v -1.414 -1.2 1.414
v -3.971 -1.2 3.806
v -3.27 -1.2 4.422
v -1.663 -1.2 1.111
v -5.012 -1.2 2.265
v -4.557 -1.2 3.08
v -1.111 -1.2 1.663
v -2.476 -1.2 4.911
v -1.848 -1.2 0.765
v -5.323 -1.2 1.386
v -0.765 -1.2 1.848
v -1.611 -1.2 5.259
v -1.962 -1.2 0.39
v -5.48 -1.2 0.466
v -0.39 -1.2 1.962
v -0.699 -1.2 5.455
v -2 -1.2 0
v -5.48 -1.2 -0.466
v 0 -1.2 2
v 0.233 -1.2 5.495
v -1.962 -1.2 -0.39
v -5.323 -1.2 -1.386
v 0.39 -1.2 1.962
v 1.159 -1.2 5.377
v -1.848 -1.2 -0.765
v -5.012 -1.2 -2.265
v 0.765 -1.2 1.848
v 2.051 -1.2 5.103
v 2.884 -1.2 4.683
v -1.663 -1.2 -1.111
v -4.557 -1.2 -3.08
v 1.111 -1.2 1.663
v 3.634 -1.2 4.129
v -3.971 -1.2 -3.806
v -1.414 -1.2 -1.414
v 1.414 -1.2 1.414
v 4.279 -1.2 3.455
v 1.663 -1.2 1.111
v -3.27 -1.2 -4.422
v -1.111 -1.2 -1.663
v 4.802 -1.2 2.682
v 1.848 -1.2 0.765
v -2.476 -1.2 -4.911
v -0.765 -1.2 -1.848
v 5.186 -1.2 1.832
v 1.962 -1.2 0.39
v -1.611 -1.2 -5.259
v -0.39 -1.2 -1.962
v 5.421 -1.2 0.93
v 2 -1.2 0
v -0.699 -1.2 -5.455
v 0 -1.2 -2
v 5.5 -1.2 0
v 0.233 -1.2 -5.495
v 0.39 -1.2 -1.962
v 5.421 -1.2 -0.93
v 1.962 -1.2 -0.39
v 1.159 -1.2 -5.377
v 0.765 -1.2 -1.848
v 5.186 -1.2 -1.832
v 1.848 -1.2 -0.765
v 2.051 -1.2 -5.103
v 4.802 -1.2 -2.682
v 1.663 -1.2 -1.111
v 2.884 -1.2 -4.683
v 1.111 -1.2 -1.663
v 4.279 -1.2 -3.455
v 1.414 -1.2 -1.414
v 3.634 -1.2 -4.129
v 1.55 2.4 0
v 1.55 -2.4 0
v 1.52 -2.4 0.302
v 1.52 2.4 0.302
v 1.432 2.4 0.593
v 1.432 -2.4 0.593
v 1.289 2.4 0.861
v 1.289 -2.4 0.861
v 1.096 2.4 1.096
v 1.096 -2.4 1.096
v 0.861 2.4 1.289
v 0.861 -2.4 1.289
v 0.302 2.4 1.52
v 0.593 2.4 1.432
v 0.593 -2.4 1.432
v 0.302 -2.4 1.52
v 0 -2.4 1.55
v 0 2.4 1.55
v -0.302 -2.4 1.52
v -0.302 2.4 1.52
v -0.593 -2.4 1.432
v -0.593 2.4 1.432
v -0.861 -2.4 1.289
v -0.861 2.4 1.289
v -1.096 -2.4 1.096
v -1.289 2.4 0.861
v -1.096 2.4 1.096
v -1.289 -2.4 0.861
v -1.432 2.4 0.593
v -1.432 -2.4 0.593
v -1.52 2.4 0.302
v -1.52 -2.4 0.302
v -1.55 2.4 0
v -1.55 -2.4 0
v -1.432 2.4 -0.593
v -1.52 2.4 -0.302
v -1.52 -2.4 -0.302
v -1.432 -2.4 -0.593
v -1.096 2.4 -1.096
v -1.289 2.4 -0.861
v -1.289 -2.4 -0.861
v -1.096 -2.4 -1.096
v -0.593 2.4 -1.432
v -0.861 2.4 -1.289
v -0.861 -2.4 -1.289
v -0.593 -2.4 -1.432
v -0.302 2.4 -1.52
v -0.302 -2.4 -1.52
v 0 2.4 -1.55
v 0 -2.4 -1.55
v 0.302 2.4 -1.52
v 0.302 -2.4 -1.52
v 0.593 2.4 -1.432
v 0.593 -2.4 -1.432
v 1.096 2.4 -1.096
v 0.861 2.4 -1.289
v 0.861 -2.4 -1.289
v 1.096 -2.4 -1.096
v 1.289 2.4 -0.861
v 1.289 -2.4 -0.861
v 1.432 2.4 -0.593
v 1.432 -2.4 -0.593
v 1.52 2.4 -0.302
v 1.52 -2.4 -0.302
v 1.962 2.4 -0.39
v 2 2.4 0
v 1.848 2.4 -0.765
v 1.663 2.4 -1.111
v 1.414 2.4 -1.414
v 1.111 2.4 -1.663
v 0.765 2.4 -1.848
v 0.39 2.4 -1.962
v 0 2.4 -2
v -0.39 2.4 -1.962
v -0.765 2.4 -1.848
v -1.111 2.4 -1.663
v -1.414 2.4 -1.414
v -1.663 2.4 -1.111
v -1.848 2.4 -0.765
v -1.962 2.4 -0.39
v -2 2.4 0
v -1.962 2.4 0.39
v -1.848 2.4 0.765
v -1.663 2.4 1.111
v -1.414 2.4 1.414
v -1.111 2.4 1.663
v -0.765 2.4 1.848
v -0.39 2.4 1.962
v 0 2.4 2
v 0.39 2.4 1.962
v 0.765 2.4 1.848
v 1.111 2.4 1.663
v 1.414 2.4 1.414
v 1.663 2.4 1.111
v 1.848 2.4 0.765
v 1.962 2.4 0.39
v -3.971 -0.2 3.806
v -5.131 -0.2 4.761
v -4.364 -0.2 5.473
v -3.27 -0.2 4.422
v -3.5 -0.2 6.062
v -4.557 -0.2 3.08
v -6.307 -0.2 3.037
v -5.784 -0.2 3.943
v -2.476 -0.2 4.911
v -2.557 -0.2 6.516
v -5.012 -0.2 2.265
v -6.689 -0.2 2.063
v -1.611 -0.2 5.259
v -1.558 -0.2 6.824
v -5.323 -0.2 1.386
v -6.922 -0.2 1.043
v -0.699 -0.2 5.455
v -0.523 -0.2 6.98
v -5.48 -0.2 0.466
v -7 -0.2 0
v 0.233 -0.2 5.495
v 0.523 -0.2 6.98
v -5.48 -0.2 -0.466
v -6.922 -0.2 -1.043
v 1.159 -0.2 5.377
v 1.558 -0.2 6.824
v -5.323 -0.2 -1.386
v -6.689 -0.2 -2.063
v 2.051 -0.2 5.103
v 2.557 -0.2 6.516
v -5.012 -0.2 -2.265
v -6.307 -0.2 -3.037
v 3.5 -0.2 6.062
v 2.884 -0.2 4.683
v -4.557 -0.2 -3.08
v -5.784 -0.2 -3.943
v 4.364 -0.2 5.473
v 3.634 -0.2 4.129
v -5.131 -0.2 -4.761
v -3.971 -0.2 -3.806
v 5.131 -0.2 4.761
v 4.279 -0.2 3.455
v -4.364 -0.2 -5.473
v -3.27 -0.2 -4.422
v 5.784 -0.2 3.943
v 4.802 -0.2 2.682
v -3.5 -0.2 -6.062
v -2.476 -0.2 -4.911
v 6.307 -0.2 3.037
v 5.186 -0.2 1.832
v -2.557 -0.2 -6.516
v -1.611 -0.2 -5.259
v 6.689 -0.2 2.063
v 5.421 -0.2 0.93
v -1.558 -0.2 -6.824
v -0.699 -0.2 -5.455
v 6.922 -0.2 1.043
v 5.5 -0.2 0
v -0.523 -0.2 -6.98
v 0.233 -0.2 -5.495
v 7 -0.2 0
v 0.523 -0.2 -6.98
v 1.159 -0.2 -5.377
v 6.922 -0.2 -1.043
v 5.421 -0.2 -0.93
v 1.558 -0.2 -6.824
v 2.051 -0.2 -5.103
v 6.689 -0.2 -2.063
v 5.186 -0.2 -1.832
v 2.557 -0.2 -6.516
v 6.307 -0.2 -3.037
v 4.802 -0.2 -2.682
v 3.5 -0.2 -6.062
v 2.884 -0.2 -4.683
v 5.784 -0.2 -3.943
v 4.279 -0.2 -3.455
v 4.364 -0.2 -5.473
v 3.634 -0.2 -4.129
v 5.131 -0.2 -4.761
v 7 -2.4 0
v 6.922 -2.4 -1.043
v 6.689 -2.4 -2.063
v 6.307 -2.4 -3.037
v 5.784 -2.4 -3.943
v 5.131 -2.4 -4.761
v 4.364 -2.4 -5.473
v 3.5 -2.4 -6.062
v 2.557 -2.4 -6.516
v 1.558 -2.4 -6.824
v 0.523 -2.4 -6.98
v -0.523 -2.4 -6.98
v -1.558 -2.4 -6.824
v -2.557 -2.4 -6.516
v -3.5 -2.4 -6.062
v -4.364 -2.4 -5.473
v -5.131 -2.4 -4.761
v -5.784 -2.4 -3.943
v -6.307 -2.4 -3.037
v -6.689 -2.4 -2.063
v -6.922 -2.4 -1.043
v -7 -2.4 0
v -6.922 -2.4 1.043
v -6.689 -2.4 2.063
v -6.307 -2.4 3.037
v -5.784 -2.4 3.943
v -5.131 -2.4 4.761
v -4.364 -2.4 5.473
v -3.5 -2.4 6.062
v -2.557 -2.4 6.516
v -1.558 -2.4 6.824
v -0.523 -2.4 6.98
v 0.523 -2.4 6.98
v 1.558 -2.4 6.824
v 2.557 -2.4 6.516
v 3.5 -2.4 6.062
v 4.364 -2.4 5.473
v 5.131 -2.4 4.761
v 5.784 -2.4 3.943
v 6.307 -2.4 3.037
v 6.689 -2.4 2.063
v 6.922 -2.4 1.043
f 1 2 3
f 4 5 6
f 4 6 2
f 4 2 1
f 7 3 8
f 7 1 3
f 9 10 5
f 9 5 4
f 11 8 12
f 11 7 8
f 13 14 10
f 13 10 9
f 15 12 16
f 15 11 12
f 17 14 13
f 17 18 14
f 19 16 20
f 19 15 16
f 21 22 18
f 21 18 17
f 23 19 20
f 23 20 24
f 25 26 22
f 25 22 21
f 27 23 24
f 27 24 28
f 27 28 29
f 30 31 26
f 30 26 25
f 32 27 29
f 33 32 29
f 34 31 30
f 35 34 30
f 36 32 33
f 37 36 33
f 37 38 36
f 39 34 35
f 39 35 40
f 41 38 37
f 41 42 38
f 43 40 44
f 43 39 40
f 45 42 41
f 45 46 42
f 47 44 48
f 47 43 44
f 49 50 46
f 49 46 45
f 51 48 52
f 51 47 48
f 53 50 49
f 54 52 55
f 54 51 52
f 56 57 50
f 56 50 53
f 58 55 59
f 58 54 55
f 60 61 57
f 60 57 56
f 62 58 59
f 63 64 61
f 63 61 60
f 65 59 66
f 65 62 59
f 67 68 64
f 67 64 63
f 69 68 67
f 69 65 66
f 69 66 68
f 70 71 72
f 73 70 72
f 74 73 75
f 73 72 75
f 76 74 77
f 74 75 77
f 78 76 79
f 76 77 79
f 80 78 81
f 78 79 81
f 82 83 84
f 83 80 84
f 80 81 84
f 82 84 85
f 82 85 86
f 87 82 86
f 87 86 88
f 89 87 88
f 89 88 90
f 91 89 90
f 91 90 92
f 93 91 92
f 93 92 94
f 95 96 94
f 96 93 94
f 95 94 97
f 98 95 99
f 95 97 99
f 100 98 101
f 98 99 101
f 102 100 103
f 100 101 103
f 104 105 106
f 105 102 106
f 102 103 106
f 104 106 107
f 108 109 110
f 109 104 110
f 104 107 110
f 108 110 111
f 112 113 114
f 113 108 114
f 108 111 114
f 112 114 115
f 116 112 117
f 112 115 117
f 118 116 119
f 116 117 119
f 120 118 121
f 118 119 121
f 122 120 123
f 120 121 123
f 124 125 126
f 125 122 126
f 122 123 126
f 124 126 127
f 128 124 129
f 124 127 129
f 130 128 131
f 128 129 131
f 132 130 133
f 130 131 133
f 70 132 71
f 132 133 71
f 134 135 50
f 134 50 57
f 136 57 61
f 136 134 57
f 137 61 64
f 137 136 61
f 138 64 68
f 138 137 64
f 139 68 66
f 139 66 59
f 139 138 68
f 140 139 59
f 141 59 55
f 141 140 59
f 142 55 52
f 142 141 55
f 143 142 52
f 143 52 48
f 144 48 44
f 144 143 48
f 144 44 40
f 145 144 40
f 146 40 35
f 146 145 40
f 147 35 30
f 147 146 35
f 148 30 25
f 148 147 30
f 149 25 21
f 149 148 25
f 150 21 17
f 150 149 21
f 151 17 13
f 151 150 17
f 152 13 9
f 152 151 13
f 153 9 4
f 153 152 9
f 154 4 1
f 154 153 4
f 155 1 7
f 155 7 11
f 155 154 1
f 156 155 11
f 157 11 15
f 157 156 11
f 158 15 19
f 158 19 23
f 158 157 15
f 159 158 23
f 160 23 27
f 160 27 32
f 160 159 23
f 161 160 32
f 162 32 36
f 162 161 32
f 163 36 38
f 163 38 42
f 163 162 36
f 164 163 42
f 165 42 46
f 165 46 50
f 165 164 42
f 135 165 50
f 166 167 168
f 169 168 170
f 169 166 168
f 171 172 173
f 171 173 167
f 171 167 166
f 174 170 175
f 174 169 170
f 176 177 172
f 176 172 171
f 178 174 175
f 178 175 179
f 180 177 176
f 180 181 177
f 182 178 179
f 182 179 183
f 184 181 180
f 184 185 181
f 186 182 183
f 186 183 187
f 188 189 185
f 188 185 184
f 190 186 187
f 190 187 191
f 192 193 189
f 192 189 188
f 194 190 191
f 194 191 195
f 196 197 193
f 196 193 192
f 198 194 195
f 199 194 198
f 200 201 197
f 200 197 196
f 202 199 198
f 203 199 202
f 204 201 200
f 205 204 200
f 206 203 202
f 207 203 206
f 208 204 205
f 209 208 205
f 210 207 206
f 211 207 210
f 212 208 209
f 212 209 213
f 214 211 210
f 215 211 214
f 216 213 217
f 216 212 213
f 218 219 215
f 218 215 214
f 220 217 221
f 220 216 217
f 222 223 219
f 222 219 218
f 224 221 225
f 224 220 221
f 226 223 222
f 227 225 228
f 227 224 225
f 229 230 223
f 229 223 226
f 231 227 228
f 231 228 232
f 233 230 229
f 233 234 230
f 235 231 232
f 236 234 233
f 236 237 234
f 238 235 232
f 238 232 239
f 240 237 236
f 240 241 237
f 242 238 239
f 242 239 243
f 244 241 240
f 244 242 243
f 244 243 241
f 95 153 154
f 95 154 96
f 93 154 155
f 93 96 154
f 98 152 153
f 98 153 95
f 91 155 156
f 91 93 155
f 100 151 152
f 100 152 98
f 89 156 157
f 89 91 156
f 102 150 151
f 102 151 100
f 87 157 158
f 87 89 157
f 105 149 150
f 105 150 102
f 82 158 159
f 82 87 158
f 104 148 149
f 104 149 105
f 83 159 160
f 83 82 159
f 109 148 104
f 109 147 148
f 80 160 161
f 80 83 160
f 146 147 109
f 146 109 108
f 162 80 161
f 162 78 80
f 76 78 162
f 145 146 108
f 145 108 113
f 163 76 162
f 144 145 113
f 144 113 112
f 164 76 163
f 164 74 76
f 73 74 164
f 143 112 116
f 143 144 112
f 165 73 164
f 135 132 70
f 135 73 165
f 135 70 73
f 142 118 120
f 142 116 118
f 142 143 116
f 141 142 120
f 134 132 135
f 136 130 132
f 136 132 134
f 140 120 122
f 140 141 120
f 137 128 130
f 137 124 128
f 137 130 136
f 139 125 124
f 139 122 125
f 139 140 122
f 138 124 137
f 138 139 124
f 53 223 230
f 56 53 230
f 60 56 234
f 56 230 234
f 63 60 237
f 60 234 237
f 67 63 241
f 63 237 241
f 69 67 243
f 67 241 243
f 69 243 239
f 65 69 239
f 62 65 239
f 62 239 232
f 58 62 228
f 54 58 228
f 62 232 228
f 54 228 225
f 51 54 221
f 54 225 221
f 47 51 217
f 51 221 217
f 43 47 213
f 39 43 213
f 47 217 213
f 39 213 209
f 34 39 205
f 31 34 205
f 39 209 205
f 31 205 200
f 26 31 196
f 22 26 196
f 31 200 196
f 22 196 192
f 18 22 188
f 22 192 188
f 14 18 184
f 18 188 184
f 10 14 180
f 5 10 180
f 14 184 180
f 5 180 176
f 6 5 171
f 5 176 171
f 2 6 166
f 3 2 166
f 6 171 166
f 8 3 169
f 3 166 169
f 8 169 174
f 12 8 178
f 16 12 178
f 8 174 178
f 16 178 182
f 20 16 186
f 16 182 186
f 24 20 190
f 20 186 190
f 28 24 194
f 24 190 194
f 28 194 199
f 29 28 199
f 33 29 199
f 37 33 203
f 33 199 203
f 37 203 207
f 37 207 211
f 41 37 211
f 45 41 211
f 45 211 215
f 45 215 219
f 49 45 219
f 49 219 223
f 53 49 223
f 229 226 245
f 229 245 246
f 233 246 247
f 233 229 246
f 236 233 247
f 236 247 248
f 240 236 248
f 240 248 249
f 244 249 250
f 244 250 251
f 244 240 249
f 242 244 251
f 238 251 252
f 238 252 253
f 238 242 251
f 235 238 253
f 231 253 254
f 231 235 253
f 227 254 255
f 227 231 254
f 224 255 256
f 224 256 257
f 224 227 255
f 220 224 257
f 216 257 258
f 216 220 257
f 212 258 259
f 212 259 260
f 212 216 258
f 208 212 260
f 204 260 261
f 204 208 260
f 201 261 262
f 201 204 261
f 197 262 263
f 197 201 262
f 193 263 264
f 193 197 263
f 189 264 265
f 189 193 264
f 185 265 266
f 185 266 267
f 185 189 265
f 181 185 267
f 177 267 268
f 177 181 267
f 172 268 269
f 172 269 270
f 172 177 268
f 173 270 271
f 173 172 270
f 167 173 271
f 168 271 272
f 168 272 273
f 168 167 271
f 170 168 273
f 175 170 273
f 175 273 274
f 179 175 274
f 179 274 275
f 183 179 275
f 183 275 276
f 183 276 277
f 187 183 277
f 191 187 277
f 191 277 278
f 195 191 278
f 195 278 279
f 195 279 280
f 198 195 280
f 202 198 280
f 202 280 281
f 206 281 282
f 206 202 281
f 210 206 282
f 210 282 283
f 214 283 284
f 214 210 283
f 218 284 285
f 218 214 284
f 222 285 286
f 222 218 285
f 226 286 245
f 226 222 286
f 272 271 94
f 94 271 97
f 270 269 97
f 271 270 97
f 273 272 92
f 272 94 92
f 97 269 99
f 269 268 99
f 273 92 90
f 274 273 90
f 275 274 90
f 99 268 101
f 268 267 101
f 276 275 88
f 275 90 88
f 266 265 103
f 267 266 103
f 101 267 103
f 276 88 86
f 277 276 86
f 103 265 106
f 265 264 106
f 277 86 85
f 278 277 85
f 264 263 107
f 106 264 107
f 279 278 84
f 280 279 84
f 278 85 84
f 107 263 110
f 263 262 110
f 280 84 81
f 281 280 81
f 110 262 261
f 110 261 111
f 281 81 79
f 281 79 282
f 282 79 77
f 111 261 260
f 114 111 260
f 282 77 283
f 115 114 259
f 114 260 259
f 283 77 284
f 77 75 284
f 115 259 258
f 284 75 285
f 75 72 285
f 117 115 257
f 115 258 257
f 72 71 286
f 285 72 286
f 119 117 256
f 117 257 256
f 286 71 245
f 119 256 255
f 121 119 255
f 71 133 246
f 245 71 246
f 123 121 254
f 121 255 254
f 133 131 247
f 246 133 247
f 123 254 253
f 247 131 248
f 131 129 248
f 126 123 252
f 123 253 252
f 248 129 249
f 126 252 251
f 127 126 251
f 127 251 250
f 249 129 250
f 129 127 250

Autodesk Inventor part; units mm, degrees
ref_plane "YZ Plane" through (0, 0, 0) normal (1, 0, 0) x (0, 1, 0)
ref_plane "XZ Plane" through (0, 0, 0) normal (0, 1, 0) x (-1, 0, 0)
ref_plane "XY Plane" through (0, 0, 0) normal (0, 0, 1) x (1, 0, 0)
sketch "スケッチ1" plane through (0, 0, 0) normal (0, 0, 1) x (1, 0, 0)
  line L0 (1.55, 2.4) -> (1.55, -2.4)
  line L1 (1.55, -2.4) -> (7, -2.4)
  line L2 (7, -2.4) -> (7, -0.2)
  line L3 (7, -0.2) -> (2, -0.2)
  line L4 (2, -0.2) -> (2, 2.4)
  line L5 (2, 2.4) -> (1.55, 2.4)
  line L6 (0, -3.36) -> (0, 3.36) projected
  point P0 (0, 0)
  point P1 (1.55, 0)
  dimension "d0" = 1.55
  dimension "d1" = 2
  dimension "d2" = 2.6
  dimension "d3" = 7
  dimension "d4" = 2.2
revolve "回転1" add sketch "スケッチ1" angle 360 about axis through (0, -10, 0) along (0, 1, 0)
sketch "スケッチ2" plane through (0, -0.2, 0) normal (0, 1, 0) x (1, 0, 0)
  circle A0 centre (0, 0) radius 2 projected
  circle A1 centre (0, 0) radius 5.5
  dimension "d6" = 11
extrude "押し出し1" cut sketch "スケッチ2" against normal blind 1
properties part number "足裏_サブフレーム_1_2" material "アセタール樹脂、黒"
